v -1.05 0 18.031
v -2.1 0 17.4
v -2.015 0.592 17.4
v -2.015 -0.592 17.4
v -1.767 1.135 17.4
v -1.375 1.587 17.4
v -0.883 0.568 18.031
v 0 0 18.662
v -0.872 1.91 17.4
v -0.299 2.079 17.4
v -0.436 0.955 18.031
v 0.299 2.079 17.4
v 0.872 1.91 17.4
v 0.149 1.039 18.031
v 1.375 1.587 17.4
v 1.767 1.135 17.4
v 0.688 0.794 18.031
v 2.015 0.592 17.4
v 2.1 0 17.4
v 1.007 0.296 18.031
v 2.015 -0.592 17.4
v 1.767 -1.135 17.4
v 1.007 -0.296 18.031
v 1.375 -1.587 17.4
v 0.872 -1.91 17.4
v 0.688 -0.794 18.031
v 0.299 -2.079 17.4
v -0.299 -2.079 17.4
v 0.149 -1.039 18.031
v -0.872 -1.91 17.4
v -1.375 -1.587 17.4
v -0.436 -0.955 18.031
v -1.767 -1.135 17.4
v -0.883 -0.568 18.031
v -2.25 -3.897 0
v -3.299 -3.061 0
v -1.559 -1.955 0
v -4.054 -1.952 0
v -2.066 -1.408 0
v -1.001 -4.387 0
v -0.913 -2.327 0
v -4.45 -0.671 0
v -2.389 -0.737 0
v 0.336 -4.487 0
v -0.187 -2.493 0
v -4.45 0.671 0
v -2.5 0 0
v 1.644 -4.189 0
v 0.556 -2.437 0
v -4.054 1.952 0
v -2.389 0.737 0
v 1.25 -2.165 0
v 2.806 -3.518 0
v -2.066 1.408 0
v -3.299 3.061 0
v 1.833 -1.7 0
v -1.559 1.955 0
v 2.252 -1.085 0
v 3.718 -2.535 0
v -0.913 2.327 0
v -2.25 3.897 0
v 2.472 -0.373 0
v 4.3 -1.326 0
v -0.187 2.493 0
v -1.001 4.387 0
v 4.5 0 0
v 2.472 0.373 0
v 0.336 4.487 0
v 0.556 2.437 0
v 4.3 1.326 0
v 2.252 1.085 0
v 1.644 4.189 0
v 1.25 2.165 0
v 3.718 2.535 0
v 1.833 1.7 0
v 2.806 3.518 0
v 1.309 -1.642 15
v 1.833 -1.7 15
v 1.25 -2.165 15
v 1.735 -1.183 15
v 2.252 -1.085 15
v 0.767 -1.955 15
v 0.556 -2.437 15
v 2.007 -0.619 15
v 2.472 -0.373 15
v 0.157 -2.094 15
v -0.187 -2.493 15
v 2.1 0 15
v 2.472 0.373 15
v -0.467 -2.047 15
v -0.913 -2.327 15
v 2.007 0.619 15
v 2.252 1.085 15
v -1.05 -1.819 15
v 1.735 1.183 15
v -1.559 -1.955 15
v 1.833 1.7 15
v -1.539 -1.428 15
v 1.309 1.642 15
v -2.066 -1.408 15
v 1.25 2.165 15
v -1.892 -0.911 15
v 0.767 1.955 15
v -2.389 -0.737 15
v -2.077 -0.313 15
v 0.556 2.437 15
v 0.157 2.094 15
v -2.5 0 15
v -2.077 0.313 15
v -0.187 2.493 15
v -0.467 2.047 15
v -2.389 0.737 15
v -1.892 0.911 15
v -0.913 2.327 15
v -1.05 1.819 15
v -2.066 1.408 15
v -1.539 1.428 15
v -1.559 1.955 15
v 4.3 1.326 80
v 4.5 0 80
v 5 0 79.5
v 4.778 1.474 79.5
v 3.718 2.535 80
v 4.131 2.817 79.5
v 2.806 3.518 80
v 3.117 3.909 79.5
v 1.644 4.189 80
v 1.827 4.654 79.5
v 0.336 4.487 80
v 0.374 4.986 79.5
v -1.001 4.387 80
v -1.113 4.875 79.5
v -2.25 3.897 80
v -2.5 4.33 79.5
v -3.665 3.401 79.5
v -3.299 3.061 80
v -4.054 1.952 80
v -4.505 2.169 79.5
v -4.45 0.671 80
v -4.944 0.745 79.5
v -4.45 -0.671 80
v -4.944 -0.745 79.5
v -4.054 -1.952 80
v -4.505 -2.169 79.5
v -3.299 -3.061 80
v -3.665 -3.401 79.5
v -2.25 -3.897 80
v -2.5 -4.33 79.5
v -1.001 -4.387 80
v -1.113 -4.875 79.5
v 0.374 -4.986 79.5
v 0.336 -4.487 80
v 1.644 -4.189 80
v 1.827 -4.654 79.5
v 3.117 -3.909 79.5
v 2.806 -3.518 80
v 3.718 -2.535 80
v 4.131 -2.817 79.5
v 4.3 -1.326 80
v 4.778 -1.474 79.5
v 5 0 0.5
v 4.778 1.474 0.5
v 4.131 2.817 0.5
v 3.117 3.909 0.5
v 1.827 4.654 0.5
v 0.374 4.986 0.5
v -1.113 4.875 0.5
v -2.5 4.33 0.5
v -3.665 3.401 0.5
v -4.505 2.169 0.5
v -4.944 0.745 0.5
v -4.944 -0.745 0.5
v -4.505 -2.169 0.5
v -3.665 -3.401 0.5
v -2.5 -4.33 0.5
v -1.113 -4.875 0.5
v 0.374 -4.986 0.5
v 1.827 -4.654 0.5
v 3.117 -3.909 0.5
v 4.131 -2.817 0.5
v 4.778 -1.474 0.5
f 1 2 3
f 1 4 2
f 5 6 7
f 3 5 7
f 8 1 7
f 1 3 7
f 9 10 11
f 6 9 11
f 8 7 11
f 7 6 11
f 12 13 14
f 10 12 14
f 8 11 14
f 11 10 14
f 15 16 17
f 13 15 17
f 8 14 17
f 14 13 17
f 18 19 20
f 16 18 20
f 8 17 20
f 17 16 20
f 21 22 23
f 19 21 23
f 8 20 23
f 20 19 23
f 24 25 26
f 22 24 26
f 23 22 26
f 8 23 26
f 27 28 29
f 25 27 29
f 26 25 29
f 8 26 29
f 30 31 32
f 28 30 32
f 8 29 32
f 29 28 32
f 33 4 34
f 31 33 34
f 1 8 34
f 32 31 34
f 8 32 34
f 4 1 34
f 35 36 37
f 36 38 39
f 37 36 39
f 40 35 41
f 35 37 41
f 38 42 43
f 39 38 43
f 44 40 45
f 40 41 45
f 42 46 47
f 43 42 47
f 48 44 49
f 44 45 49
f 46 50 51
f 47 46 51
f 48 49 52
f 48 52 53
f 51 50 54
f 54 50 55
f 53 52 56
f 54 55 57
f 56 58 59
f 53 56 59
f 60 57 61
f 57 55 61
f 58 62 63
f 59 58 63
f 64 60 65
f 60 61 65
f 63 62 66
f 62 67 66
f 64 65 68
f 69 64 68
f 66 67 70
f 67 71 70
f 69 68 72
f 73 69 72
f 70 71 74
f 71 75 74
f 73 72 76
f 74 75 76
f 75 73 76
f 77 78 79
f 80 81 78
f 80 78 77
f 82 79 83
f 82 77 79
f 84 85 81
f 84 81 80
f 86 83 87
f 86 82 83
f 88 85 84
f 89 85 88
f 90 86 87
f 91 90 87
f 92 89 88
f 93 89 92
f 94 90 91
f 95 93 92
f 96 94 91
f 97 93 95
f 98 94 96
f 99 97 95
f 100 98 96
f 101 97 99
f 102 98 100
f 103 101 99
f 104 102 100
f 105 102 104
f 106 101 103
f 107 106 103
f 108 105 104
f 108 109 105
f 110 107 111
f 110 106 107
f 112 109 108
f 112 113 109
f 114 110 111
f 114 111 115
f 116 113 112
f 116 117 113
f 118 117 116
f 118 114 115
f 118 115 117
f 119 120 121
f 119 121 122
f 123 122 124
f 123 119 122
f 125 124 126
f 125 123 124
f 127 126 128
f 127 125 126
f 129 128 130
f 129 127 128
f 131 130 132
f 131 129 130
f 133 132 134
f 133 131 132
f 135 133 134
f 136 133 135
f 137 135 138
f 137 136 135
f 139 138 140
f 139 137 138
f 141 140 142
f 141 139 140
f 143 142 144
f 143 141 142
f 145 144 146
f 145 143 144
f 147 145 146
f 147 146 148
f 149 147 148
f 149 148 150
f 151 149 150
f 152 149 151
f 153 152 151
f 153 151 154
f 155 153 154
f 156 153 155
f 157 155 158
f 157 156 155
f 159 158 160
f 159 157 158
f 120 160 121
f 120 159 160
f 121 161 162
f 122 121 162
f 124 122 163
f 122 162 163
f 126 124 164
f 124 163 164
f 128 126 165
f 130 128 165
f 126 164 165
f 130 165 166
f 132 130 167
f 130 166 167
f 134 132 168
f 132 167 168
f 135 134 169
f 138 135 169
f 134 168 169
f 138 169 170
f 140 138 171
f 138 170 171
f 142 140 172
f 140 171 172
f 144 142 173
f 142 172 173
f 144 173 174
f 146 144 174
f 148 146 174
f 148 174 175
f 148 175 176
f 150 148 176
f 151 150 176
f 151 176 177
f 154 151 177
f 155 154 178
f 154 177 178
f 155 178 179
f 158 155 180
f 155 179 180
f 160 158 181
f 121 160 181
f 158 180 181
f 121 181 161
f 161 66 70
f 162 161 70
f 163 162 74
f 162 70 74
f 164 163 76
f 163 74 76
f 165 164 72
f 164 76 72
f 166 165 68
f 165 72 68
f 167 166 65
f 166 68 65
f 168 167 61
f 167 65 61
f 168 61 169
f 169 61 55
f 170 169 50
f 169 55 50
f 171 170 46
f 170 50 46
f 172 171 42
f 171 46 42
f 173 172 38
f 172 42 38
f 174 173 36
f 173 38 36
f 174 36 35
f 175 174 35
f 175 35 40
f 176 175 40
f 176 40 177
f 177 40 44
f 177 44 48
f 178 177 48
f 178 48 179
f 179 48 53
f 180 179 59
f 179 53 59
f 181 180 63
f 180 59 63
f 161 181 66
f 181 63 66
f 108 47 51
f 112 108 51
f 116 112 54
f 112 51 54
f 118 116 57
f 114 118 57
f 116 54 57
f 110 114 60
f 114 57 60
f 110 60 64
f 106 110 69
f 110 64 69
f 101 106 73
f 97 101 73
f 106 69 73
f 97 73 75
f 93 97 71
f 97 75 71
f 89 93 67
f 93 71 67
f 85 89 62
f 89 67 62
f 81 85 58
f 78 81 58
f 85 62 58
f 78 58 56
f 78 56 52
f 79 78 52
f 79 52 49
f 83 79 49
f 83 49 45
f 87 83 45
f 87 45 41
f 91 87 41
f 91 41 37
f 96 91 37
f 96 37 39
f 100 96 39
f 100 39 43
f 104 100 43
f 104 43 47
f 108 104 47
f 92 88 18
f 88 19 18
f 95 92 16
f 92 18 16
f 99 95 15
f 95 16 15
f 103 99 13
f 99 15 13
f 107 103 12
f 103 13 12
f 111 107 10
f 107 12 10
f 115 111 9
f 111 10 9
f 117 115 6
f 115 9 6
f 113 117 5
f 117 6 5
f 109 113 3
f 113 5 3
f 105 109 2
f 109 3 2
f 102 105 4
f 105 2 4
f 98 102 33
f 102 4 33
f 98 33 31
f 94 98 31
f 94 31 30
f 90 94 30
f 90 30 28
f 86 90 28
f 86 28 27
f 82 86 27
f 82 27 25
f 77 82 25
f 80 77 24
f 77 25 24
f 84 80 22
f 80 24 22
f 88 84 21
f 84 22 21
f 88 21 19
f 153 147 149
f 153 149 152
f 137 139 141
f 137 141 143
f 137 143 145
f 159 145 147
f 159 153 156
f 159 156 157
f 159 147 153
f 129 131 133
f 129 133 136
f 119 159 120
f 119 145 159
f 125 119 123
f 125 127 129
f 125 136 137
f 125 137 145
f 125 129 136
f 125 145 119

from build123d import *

# Parameters (mm, degrees)
SKETCH_1_R                   = 5
EXTRUDE_1_DEPTH              = 80
HOLE_WIZARD_M5_1_D           = 4.2
HOLE_WIZARD_M5_1_DEPTH       = 17.4
HOLE_WIZARD_M5_1_CBORE_D     = 5
HOLE_WIZARD_M5_1_CBORE_DEPTH = 15
HOLE_WIZARD_M5_1_TIP         = 1.2618073
CHAMFER_1_SIZE               = 0.5


with BuildPart() as part:
    # 草图1 → 拉伸1 (new body)
    with BuildSketch(Plane.XY):
        Circle(SKETCH_1_R)
    extrude(amount=EXTRUDE_1_DEPTH)

    # M5 螺纹孔1
    with Locations(Plane(origin=(0, 0, 0), x_dir=(-1, 0, 0), z_dir=(0, 0, -1))):
        with Locations((0, 0)):
            CounterBoreHole(HOLE_WIZARD_M5_1_D / 2, HOLE_WIZARD_M5_1_CBORE_D / 2, HOLE_WIZARD_M5_1_CBORE_DEPTH, depth=HOLE_WIZARD_M5_1_DEPTH)
            with Locations((0, 0, -(HOLE_WIZARD_M5_1_DEPTH + HOLE_WIZARD_M5_1_TIP / 2))):  # 118° drill point
                Cone(0, HOLE_WIZARD_M5_1_D / 2, HOLE_WIZARD_M5_1_TIP, mode=Mode.SUBTRACT)

    # 倒角1
    chamfer_1_edges = [part.edges().sort_by_distance(p)[0] for p in [
        (-5, 0, 0),
        (-5, 0, 80),
    ]]
    chamfer(chamfer_1_edges, length=CHAMFER_1_SIZE)


solid = part.part
